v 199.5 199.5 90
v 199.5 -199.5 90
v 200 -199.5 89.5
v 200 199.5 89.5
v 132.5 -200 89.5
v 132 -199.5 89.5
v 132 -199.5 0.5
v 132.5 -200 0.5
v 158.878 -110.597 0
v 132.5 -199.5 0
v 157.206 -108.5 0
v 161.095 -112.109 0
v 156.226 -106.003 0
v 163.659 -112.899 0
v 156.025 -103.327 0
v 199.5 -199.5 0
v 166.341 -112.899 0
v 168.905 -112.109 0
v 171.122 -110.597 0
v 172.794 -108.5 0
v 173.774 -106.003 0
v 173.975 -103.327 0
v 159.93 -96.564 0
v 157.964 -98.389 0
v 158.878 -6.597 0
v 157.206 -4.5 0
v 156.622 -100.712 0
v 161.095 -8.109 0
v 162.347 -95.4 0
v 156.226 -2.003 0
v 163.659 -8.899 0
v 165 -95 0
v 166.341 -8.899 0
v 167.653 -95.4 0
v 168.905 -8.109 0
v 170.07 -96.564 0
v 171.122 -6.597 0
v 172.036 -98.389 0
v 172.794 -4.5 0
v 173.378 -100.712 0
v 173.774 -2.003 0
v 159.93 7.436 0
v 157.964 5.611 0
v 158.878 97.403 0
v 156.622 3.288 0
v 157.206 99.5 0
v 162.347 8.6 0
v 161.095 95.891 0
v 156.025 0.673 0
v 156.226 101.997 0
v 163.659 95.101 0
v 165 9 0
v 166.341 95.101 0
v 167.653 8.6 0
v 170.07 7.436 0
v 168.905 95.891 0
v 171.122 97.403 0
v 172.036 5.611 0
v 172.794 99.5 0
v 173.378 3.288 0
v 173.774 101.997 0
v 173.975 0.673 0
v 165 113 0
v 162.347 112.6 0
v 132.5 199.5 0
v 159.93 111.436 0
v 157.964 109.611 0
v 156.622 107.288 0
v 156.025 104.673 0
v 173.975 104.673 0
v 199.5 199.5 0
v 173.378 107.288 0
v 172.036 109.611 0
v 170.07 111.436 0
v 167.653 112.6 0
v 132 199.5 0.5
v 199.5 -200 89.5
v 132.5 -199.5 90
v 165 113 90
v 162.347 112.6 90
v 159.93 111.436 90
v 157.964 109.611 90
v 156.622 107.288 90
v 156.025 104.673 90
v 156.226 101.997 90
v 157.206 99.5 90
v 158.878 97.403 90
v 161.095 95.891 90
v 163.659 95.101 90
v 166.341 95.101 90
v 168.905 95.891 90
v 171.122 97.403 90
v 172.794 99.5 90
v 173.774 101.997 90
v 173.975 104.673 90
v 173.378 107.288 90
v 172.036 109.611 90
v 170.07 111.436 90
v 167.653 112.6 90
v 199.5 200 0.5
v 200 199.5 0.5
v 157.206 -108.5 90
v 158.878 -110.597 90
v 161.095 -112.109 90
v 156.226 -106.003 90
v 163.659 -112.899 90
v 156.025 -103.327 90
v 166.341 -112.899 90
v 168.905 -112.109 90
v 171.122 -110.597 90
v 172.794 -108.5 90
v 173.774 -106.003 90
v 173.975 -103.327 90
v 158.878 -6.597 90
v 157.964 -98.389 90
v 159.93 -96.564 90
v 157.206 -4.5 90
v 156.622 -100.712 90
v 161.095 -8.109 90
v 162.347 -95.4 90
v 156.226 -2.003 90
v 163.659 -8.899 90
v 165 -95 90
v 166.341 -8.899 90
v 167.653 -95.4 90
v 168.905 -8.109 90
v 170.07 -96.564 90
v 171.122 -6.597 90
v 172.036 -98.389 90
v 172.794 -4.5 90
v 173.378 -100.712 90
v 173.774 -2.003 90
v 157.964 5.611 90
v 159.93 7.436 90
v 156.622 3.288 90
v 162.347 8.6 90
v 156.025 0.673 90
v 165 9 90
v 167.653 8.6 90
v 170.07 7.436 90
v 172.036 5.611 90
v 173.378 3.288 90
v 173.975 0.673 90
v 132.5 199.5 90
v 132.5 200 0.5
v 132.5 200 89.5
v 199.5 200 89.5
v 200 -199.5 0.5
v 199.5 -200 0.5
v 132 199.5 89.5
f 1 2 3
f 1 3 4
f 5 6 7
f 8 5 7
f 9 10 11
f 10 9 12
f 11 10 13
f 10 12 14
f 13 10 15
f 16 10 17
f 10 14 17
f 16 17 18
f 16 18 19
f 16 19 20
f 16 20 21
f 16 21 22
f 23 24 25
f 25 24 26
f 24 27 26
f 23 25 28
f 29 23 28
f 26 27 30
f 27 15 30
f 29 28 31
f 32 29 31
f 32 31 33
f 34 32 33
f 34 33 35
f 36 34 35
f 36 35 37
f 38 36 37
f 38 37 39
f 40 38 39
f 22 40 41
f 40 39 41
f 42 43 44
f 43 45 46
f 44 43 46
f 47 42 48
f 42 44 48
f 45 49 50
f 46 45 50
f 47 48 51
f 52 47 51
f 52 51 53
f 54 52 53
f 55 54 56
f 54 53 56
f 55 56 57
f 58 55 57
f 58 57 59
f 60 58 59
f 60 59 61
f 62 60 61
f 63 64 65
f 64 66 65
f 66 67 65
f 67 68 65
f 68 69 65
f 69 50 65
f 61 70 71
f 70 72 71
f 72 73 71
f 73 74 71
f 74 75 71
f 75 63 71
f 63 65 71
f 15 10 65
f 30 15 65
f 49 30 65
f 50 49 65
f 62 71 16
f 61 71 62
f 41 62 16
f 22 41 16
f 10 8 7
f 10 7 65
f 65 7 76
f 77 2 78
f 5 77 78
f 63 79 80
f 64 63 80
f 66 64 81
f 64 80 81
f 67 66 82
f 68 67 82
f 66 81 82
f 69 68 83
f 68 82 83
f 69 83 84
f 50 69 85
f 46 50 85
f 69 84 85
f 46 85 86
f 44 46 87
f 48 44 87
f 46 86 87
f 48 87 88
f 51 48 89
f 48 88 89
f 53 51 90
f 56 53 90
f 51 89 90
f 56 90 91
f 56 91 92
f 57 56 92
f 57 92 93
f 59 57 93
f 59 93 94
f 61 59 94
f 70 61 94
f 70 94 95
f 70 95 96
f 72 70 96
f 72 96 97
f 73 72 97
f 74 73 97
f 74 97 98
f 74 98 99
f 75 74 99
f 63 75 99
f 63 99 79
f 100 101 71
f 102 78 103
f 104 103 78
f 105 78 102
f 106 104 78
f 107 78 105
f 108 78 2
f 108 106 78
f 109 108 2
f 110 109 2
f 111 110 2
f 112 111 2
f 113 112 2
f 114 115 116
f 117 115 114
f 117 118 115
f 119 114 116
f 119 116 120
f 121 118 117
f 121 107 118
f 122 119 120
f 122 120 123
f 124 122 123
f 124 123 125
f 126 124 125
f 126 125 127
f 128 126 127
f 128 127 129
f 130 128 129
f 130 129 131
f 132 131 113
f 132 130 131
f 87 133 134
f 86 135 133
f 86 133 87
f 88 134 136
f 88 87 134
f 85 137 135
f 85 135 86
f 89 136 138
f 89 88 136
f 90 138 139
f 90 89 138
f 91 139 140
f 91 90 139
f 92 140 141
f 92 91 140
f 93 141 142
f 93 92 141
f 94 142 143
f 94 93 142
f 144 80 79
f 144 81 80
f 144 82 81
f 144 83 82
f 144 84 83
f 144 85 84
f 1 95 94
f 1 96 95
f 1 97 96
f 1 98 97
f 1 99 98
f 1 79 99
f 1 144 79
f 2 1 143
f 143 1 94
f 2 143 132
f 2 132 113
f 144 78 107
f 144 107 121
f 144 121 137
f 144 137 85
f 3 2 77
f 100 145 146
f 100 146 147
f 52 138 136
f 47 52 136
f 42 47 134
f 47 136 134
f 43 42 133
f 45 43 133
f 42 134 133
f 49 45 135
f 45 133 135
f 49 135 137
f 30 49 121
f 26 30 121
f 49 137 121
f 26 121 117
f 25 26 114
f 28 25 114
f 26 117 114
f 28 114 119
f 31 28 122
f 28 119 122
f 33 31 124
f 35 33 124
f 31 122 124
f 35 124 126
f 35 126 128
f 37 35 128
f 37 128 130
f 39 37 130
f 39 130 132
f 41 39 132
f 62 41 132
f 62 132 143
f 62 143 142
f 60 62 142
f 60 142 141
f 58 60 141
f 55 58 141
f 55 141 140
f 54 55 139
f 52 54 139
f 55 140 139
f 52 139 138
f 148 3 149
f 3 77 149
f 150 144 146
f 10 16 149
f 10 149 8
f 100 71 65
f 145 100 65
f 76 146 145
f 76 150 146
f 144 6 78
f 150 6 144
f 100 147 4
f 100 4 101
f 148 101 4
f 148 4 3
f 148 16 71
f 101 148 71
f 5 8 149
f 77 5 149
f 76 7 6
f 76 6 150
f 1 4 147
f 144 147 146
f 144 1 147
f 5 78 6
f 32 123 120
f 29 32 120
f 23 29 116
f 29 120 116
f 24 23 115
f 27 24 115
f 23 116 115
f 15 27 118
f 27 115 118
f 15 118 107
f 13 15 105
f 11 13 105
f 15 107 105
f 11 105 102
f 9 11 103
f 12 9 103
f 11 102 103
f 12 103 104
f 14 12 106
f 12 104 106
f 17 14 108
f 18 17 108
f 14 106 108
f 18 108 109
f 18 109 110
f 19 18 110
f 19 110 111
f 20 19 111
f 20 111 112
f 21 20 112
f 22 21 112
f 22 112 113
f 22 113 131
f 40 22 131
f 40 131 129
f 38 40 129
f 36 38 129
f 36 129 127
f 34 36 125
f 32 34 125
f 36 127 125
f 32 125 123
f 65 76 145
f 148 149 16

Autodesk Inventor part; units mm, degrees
ref_plane "YZ Plane" through (0, 0, 0) normal (1, 0, 0) x (0, 1, 0)
sketch "Sketch1" plane through (0, 0, 0) normal (0, 0, 1) x (1, 0, 0)
  line L0 (-132, 200) -> (-200, 200)
  line L1 (-200, 200) -> (-200, -200)
  line L2 (-200, -200) -> (-132, -200)
  line L3 (-132, -200) -> (-132, 200)
  line L4 (200, 200) -> (200, -200)
  line L5 (132, -200) -> (132, 200)
  line L6 (132, 200) -> (200, 200)
  line L7 (132, -200) -> (200, -200)
  point P0 (0, 0)
  point P1 (-132, 0)
  point P2 (132, 0)
  point P3 (-165, 104)
  point P4 (165, 104)
  dimension "d85" = 400
  dimension "d86" = 68
  dimension "d88" = 68
  dimension "d89" = 200
  dimension "d93" = 400
  dimension "d94" = 200
  dimension "d98" = 104
  dimension "d100" = 165
  dimension "d101" = 165
  dimension "d102" = 104
extrude "Extrusion1" [suppressed]
extrude "Extrusion2" add sketch "Sketch1" along normal blind 90 contours L4 L7 L5 L6
hole "Hole1" [suppressed]
pattern_linear "Rectangular Pattern1" [suppressed]
hole "Hole2" at (165, 104, 0) direction (0, 0, 1) diameter 18 depth 90
pattern_linear "Rectangular Pattern2" count 3 spacing 104 along (0, -1, 0) of "Hole2"
ref_plane "Work Plane1" through (0, 0, 90) normal (0, 0, 1) x (1, 0, 0)
ref_plane "Work Plane2" through (0, 0, 0) normal (0, 0, -1) x (-1, 0, 0)
chamfer "Chamfer1" [suppressed]
chamfer "Chamfer2" distance 0.5 angle 45 12 edges at (132, 0, 90) (200, 0, 90) (166, -200, 90) (132, -200, 45) (200, -200, 45) (166, -200, 0) (200, 0, 0) (132, 0, 0) (200, 200, 45) (166, 200, 90) (132, 200, 45) (166, 200, 0)
equation "\"d85\" = L"
equation "\"d86\" = W_"
equation "\"d88\" = W_"
equation "\"d89\" = 0.5 * M_W"
equation "\"d93\" = L"
equation "\"d94\" = 0.5 * M_W"
equation "\"d98\" = 0.5 * S1_L"
equation "\"d100\" = 0.5 * S1_W"
equation "\"d101\" = 0.5 * S1_W"
equation "\"d102\" = 0.5 * S1_L"
equation "\"d20\" = H_"
equation "\"d95\" = H_"
equation "\"d129\" = S1_d1"
equation "\"d134\" = H_"
equation "\"d122\" = S1_d1"
equation "\"d127\" = H_"
equation "\"L\" = 400"
equation "\"W_\" = 68"
equation "\"H_\" = 90"
equation "\"S1_d1\" = 18"
equation "\"M_W\" = 400"
equation "\"S1_L\" = 208"
equation "\"S1_W\" = 330"
properties part number "SA-SB-400x400x90" material "S 55 C"
